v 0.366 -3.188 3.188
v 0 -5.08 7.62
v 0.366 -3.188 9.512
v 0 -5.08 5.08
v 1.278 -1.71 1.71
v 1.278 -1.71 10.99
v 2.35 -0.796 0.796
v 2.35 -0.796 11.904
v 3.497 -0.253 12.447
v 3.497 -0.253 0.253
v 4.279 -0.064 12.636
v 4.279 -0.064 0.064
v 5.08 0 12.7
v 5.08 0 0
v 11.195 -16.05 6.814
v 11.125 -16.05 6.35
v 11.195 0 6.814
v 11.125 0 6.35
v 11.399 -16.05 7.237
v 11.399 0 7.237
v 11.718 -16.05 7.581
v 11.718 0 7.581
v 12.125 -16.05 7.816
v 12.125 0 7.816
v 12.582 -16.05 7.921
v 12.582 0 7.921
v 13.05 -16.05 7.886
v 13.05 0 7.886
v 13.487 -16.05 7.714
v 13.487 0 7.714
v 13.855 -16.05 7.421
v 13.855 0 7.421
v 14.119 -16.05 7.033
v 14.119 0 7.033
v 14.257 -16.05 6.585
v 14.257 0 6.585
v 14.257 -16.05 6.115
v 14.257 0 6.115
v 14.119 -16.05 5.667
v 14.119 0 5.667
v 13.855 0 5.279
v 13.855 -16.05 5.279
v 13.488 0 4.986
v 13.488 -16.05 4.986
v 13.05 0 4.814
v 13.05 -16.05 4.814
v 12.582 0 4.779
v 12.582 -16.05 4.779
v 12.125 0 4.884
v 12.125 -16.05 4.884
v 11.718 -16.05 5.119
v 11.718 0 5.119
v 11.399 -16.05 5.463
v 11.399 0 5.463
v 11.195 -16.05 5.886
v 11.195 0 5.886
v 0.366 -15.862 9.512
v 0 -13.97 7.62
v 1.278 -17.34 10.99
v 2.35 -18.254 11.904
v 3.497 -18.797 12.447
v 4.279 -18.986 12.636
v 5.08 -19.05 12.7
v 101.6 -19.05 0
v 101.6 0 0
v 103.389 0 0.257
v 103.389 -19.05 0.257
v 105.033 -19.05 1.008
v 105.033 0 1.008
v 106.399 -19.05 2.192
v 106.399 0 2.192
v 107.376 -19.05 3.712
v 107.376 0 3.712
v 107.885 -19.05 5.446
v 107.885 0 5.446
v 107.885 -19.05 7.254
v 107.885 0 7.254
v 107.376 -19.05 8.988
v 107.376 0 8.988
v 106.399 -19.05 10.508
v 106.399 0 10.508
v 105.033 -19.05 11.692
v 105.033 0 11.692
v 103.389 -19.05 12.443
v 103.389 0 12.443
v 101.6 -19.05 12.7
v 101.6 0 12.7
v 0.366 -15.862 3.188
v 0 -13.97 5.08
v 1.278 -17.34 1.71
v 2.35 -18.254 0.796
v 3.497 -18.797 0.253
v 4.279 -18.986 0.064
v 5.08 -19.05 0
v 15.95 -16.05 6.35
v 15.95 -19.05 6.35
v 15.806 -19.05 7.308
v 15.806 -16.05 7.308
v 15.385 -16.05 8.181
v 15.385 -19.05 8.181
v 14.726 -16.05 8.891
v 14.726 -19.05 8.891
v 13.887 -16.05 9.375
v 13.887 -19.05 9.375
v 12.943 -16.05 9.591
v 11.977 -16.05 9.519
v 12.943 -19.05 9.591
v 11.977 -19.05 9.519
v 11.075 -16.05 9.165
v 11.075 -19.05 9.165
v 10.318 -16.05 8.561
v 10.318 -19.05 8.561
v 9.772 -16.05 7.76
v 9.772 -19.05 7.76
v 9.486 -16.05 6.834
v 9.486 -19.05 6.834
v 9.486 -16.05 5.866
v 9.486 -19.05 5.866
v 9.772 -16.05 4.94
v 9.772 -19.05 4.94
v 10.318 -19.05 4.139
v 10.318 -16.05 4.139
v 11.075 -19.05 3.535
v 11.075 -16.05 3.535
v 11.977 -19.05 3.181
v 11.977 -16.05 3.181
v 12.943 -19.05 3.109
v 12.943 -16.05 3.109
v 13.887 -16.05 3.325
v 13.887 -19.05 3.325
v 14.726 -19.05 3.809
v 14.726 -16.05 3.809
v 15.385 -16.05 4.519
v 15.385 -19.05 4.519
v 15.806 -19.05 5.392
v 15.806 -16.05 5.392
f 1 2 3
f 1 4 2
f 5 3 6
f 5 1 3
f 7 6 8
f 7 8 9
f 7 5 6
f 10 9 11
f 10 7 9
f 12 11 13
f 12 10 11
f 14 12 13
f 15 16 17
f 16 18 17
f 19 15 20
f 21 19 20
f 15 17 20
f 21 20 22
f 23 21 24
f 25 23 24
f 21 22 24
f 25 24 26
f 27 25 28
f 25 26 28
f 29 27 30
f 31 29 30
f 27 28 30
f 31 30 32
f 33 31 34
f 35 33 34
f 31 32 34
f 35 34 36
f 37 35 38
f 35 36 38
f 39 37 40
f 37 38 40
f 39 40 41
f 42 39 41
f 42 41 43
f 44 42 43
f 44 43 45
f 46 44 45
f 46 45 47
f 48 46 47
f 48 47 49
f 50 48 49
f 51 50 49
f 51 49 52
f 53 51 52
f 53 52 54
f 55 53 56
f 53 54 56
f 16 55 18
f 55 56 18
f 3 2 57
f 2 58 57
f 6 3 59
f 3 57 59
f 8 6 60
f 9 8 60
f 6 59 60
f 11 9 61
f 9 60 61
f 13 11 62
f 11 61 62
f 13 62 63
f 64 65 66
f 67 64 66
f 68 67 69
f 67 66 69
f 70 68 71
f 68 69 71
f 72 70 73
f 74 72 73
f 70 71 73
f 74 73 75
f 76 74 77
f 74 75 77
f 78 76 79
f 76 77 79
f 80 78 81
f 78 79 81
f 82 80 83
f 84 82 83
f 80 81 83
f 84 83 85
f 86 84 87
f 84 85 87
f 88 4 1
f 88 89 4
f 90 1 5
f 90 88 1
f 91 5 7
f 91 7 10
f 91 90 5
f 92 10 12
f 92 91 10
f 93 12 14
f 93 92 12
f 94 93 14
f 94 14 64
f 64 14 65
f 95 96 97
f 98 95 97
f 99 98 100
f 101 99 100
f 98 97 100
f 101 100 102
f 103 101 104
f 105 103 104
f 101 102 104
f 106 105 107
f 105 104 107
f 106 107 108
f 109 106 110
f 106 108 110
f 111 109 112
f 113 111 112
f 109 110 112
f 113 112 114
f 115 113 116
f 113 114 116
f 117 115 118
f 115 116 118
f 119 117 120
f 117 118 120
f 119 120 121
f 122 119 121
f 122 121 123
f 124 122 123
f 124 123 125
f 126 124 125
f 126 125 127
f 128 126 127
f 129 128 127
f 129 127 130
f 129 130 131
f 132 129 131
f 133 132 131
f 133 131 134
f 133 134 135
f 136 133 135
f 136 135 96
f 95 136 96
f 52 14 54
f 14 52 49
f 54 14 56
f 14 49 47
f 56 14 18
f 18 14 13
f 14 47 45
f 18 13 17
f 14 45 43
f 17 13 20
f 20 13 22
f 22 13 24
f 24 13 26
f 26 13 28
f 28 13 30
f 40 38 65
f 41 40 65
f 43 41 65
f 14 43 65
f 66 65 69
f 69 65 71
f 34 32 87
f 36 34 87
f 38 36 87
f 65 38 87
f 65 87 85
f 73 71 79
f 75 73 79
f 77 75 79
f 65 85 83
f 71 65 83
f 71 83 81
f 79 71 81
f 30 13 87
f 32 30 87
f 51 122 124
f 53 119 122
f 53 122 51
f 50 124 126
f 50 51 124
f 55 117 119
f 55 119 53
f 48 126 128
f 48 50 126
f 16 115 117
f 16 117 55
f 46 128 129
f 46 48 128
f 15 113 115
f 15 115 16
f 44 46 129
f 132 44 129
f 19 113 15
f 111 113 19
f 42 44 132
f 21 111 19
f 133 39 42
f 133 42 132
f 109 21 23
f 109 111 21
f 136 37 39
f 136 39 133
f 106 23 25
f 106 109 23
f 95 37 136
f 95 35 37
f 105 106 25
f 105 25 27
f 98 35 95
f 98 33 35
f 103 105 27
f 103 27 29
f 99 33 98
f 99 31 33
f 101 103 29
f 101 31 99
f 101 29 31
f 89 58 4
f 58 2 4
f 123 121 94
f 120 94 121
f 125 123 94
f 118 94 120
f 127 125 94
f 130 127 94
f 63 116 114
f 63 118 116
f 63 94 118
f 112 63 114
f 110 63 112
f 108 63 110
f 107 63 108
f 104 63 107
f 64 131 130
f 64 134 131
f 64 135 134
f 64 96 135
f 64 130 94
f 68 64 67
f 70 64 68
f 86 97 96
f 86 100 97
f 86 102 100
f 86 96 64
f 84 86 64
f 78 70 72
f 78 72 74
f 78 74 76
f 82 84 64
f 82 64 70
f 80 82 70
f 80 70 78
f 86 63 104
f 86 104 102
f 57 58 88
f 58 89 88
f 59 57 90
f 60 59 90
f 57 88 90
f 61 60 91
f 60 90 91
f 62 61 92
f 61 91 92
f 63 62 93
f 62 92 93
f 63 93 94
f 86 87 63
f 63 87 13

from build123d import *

# Parameters (mm, degrees)
F1_DEPTH       = 19.05
F2_R           = 5.08
F4_D           = 3.15
F4_CBORE_D     = 6.5
F4_CBORE_DEPTH = 3


with BuildPart() as f1:
    # F0 (on Front) → F1 (new body)
    with BuildSketch(Plane.XZ):
        with BuildLine():
            Line((0, 12.7), (0, 0))
            Line((0, 0), (101.6, 0))
            ThreePointArc((101.6, 0), (107.95, 6.35), (101.6, 12.7))
            Line((101.6, 12.7), (0, 12.7))
        make_face()
    extrude(amount=F1_DEPTH)

    # F2
    f2_edges = [f1.edges().sort_by_distance(p)[0] for p in [
        (0, -19.05, 6.35),
        (0, -9.525, 12.7),
        (0, 0, 6.35),
        (0, -9.525, 0),
    ]]
    fillet(f2_edges, radius=F2_R)

    # F4 (through all)
    with Locations(Plane.XZ.offset(19.05)):
        with Locations((12.7, 6.35)):
            CounterBoreHole(F4_D / 2, F4_CBORE_D / 2, F4_CBORE_DEPTH)


solid = f1.part
